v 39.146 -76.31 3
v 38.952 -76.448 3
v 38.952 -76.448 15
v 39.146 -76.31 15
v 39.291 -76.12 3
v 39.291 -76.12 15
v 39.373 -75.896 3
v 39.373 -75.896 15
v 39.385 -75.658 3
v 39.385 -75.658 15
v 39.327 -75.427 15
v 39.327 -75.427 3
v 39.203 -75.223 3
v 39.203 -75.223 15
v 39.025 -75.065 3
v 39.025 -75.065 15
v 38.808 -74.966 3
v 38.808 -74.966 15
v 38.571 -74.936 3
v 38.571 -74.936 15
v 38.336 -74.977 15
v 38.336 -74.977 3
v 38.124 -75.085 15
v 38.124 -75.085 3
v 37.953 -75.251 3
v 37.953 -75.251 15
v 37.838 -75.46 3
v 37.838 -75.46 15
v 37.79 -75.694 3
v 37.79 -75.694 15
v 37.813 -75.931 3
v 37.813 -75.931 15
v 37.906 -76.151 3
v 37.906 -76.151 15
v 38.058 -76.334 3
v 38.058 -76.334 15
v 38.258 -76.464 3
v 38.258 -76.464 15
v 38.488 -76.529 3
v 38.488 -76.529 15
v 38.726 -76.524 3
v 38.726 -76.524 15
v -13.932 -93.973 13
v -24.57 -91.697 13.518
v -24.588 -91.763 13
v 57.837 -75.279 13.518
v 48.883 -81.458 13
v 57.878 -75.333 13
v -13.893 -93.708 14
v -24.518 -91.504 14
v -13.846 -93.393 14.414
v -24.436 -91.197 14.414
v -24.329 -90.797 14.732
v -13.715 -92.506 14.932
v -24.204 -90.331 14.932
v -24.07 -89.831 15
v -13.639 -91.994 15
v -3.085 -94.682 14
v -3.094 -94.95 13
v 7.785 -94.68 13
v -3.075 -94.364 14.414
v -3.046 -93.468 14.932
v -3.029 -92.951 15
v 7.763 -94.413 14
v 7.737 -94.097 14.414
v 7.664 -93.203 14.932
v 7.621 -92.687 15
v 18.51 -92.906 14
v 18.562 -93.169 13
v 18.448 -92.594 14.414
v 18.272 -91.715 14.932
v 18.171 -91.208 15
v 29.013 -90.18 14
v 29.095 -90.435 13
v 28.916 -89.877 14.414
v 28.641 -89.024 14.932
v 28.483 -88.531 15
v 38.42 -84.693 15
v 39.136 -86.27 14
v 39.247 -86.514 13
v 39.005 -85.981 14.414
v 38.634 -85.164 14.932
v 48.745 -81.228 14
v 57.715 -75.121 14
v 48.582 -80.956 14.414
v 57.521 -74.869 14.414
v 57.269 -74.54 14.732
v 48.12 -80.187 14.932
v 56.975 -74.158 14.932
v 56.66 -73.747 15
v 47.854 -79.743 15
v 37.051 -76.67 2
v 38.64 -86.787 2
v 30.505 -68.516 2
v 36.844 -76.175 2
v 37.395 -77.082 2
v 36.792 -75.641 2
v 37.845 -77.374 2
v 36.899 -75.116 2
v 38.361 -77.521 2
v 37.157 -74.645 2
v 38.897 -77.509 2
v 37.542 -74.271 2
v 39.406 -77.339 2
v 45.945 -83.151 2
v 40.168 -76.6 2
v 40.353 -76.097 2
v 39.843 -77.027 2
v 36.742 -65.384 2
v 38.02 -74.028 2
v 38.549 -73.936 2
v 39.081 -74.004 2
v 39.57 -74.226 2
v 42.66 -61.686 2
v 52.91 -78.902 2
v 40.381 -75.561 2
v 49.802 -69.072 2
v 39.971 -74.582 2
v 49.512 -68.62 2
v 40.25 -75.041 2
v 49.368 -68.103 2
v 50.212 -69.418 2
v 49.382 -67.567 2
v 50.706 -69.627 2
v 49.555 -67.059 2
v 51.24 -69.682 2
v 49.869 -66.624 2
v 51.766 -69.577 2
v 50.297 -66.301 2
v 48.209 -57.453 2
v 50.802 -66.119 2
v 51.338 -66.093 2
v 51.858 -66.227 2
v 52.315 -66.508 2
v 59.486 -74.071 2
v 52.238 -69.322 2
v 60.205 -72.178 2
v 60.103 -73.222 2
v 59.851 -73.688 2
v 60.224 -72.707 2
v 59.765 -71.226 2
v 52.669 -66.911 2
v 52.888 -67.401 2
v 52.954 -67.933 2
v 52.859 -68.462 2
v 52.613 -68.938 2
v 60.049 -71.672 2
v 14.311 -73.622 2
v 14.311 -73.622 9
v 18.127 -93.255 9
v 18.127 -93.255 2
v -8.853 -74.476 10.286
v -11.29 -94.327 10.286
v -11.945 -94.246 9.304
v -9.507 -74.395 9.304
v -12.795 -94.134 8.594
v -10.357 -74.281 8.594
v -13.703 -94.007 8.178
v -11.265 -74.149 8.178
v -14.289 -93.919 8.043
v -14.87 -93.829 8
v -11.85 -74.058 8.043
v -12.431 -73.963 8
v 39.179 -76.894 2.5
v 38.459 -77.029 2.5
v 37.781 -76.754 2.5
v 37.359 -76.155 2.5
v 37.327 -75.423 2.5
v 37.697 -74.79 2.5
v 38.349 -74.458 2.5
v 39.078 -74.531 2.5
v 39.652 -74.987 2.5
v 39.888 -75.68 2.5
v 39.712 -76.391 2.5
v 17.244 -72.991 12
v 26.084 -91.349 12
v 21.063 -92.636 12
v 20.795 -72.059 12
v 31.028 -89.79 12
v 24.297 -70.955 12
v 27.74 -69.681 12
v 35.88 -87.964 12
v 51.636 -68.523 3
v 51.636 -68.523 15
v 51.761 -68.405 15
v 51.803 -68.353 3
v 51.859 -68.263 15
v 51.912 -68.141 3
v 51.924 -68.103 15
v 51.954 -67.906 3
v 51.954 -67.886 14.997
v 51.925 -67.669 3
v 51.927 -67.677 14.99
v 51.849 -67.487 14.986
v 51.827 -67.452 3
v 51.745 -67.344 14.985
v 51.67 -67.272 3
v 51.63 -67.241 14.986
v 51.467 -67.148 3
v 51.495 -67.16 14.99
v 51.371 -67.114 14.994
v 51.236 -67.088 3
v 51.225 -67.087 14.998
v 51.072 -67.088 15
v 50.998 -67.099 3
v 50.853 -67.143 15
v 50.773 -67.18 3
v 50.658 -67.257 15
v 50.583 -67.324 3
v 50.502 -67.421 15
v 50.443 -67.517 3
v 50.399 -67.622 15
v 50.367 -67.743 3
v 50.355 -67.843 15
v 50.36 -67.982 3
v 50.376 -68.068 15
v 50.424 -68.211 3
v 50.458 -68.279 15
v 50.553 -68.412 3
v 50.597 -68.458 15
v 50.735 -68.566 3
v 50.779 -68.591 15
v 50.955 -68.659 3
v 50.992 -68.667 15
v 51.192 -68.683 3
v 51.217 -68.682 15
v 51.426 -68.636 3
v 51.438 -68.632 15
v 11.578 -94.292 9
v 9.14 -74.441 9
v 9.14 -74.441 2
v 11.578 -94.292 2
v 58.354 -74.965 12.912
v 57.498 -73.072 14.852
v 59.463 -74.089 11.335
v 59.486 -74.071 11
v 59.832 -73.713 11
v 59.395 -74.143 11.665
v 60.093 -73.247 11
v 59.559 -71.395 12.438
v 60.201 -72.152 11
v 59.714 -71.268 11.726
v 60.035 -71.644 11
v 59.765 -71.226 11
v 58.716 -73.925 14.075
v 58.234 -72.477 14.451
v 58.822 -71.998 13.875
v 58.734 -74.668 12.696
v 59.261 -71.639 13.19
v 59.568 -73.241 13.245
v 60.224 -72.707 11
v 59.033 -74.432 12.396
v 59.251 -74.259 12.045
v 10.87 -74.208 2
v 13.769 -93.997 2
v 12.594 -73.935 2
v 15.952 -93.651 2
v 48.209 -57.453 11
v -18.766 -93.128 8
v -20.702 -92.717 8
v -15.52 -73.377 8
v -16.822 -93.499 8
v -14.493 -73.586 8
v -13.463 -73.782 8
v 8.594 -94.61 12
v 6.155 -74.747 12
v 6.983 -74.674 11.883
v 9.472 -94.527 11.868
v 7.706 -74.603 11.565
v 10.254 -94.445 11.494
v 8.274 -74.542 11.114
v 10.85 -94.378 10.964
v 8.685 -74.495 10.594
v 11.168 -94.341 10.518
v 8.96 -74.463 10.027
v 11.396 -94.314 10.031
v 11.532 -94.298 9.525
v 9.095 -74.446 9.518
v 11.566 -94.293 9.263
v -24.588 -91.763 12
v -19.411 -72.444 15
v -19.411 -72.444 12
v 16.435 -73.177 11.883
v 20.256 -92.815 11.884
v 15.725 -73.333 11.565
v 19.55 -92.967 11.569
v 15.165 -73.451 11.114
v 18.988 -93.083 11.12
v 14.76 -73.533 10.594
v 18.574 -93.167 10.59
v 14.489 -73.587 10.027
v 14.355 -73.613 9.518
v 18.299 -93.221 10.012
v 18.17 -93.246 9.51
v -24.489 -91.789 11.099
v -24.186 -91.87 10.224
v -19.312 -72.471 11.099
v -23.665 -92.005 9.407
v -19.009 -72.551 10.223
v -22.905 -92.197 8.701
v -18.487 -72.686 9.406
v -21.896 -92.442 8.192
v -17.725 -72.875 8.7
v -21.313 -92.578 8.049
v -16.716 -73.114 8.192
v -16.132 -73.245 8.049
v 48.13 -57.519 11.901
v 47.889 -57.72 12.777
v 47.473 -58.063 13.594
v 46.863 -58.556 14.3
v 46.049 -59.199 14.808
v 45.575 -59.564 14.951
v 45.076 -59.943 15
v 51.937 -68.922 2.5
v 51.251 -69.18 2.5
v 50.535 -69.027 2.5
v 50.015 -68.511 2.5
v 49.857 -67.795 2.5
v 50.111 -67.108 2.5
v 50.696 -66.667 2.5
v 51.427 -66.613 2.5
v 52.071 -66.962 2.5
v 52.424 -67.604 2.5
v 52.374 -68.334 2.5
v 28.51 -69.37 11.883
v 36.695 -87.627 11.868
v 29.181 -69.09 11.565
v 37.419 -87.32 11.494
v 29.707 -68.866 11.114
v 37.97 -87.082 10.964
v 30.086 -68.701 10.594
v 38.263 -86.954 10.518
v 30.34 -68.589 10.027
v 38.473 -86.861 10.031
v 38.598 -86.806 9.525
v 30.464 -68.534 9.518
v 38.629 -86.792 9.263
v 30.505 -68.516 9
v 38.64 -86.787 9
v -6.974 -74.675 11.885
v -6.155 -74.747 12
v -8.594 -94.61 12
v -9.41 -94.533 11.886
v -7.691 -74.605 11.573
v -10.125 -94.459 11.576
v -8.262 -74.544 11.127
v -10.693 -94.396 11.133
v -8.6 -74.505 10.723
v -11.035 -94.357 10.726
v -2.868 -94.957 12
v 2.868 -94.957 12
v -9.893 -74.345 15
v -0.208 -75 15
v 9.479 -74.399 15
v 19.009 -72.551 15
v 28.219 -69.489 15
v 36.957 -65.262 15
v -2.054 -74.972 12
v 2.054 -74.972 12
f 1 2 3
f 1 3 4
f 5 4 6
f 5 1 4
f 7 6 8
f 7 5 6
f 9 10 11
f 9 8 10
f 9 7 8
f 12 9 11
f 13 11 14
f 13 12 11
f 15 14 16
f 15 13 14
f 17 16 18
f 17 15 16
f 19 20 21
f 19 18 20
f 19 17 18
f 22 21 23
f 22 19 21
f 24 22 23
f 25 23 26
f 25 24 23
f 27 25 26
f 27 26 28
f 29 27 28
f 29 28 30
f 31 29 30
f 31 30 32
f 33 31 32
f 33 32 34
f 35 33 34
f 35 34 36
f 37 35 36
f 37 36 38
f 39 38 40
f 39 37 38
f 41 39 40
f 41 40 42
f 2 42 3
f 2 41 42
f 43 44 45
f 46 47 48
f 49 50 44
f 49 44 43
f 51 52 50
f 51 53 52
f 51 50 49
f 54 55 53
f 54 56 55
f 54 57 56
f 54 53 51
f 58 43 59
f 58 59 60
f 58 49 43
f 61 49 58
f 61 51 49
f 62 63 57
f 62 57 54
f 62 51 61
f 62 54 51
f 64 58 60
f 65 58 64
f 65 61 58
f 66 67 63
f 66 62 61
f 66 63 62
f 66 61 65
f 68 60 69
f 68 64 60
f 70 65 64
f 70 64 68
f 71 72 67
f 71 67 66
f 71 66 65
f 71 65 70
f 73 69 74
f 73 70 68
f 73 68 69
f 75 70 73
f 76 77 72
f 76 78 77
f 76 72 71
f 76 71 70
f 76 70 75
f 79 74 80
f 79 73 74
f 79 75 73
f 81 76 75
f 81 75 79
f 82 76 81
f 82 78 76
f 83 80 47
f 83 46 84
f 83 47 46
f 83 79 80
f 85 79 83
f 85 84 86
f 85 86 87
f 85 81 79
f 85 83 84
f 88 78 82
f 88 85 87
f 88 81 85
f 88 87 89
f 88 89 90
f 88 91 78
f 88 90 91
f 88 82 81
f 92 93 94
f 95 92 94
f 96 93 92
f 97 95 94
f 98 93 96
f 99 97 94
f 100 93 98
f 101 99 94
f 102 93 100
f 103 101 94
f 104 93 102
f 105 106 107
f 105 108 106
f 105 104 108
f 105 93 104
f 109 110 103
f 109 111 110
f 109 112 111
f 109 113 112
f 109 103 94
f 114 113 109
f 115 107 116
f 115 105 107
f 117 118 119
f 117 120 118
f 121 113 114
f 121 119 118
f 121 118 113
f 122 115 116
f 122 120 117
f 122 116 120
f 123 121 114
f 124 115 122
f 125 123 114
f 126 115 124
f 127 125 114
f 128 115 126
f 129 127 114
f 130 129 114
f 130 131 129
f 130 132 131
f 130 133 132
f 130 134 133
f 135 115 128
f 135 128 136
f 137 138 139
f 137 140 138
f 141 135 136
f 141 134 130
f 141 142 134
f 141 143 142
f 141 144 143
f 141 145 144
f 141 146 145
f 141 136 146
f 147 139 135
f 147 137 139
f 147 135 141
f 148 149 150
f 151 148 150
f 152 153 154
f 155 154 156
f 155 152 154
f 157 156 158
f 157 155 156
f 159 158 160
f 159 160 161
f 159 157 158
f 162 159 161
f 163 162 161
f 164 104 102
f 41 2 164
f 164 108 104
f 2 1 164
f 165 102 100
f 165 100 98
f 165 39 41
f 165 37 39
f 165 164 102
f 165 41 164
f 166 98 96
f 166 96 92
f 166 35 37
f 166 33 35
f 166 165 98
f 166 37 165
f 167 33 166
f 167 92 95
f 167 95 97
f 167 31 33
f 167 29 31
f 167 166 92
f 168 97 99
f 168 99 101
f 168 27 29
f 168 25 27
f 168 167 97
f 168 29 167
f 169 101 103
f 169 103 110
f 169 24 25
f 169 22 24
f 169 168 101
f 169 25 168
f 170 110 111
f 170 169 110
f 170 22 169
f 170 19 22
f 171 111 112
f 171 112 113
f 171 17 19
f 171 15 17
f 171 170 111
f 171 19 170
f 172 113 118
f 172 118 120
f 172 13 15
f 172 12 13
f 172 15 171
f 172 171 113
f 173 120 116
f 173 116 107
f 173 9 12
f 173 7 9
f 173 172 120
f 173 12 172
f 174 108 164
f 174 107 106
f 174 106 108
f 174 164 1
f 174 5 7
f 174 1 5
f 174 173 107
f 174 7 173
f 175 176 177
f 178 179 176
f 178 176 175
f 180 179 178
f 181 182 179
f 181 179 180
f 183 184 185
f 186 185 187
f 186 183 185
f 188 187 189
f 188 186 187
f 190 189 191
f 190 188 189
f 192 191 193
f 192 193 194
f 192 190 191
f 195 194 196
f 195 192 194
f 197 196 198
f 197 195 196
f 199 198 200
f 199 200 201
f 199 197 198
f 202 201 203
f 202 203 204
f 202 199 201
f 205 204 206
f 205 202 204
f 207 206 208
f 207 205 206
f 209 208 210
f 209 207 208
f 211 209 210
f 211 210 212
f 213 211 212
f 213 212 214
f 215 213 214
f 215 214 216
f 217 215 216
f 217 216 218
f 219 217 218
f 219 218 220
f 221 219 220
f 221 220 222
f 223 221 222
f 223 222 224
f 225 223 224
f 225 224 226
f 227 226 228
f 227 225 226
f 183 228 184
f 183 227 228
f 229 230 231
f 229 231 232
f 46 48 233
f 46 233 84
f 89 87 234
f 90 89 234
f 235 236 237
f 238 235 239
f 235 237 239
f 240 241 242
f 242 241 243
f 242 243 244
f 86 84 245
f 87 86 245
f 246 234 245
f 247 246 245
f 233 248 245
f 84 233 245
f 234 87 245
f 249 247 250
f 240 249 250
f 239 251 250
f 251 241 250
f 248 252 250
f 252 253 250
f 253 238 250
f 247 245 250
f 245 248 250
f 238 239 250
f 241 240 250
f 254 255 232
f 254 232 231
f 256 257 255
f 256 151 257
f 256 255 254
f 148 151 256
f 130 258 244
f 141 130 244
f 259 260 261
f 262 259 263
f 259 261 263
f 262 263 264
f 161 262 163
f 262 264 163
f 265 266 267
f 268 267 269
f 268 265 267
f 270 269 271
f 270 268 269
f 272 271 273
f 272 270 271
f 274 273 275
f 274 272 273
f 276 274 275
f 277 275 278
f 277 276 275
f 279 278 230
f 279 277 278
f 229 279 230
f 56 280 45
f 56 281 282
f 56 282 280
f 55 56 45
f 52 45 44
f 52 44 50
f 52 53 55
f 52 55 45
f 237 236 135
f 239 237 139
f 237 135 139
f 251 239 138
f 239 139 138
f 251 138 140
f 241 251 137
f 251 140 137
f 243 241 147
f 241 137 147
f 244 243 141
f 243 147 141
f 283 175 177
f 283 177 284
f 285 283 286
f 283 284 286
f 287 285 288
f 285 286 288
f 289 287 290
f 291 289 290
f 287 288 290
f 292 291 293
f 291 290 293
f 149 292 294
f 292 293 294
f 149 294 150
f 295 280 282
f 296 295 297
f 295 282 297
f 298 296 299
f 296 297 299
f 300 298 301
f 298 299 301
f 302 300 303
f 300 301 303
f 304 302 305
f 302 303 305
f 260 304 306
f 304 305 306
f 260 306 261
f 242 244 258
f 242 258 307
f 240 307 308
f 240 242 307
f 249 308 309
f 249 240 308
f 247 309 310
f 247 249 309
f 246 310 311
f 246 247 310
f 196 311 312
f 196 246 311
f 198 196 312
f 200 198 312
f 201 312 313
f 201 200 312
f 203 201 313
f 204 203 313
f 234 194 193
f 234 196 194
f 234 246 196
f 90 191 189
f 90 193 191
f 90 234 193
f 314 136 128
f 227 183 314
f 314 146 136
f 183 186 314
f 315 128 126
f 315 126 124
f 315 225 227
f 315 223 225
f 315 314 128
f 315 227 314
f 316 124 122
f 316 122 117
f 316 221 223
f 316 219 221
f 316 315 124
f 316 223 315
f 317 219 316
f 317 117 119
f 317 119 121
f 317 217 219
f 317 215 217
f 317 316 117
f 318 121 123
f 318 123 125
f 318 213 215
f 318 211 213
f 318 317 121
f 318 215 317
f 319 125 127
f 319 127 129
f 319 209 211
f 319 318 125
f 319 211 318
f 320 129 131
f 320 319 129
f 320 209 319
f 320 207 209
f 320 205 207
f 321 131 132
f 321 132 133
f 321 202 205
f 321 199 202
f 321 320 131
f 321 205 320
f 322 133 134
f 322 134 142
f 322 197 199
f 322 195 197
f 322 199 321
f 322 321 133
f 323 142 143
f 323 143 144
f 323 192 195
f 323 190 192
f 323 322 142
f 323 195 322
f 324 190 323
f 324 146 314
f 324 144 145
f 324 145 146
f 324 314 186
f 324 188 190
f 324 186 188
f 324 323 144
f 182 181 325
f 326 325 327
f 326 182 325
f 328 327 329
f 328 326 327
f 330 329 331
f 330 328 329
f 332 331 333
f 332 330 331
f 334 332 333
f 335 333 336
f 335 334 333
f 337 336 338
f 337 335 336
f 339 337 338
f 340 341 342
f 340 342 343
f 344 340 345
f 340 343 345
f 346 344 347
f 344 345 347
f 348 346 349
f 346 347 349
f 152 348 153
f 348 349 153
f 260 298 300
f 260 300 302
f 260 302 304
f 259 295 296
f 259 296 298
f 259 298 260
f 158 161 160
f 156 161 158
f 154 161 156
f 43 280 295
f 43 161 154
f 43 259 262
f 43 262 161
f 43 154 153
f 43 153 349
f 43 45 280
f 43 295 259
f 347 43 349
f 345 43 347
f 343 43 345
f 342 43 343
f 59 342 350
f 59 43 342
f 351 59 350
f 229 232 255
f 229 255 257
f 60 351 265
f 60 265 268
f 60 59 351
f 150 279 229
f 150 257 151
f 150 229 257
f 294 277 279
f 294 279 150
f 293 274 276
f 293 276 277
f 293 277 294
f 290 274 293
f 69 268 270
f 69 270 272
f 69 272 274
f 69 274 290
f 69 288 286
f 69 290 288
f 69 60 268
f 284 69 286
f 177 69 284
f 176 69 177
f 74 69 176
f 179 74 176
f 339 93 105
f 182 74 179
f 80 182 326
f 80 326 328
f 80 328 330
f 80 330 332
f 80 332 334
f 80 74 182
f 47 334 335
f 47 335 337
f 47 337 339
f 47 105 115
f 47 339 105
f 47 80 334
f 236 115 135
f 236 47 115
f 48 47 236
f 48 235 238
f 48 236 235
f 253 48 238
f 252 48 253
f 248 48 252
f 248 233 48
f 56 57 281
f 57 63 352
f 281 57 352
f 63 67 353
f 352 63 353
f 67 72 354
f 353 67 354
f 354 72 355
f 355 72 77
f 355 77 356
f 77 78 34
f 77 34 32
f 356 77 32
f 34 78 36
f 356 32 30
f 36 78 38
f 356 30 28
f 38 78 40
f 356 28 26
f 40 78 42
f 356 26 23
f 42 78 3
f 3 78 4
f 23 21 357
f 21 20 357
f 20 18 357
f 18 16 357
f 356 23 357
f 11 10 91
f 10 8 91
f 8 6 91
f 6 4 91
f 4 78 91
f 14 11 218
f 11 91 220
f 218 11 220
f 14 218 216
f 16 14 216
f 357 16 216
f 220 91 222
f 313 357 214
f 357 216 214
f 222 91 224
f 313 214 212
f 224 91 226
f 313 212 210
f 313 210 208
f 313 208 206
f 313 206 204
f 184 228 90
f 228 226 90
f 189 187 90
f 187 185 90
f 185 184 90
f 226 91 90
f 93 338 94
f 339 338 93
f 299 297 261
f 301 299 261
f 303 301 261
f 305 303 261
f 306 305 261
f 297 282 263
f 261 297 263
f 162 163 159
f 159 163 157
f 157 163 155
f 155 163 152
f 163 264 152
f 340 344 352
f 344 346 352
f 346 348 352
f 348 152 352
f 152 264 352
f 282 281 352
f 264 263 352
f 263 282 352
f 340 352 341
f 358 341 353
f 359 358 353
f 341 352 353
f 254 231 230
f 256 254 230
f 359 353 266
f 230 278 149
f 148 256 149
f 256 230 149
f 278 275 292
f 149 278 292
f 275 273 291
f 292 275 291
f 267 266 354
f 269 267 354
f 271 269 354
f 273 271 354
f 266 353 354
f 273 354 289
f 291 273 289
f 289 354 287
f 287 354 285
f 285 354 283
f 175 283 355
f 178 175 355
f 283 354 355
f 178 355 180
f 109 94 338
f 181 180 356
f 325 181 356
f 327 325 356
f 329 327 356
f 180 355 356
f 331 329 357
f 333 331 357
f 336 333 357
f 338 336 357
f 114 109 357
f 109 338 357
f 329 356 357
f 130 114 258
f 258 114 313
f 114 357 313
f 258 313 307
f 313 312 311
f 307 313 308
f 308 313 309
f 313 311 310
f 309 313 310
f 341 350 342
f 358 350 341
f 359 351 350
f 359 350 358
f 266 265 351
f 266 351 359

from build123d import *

# Parameters (mm, degrees)
CYLINDER017_R               = 0.8
CYLINDER017_DEPTH           = 20
CYLINDER018_R               = 0.8
CYLINDER018_DEPTH           = 20
CYLINDER019_R               = 0.8
CYLINDER019_DEPTH           = 20
CYLINDER020_R               = 0.8
CYLINDER020_DEPTH           = 20
FUSION007_PLACEMENT_ANGLE   = 10
FUSION008_PLACEMENT_ANGLE   = 297
CYLINDER015_W               = 95
CYLINDER015_H               = 10
CYLINDER015_ANGLE           = 14
CYLINDER015_PLACEMENT_ANGLE = 263
FILLET_R                    = 3
BOX_W                       = 30
BOX_H                       = 30
BOX_DEPTH                   = 8
CYLINDER029_W               = 95
CYLINDER029_H               = 10
CYLINDER029_ANGLE           = 13
CYLINDER029_PLACEMENT_ANGLE = 281
FILLET026_R                 = 3
CYLINDER016_W               = 75
CYLINDER016_H               = 19
CYLINDER016_ANGLE           = 140
CYLINDER016_PLACEMENT_ANGLE = 250
CYLINDER014_W               = 95
CYLINDER014_H               = 13
CYLINDER014_ANGLE           = 55
CYLINDER014_PLACEMENT_ANGLE = 255
FILLET013_R                 = 4
FILLET014_R                 = 2
FILLET027_R                 = 4
CHAMFER_SIZE                = 1


with BuildPart() as cylinder017:
    # Cylinder017 → Cylinder017 (new body)
    with BuildSketch(Plane(origin=(85, 0, 0), x_dir=(1, 0, 0), z_dir=(0, 0, 1))):
        Circle(CYLINDER017_R)
    extrude(amount=CYLINDER017_DEPTH)


with BuildPart() as fusion006:
    # Cylinder018 → Cylinder018 (new body)
    with BuildSketch(Plane(origin=(-85, 0, 0), x_dir=(1, 0, 0), z_dir=(0, 0, 1))):
        Circle(CYLINDER018_R)
    extrude(amount=CYLINDER018_DEPTH)

    # Fusion006: union Cylinder017
    add(cylinder017.part)


with BuildPart() as cylinder019:
    # Cylinder019 → Cylinder019 (new body)
    with BuildSketch(Plane(origin=(85, 0, 0), x_dir=(1, 0, 0), z_dir=(0, 0, 1))):
        Circle(CYLINDER019_R)
    extrude(amount=CYLINDER019_DEPTH)


with BuildPart() as toothscrewholles:
    # Cylinder020 → Cylinder020 (new body)
    with BuildSketch(Plane(origin=(-85, 0, 0), x_dir=(1, 0, 0), z_dir=(0, 0, 1))):
        Circle(CYLINDER020_R)
    extrude(amount=CYLINDER020_DEPTH)

    # Fusion007: union Cylinder019
    add(cylinder019.part)


with BuildPart() as toothscrewholles_1:
    # Fusion007 placement: moved
    add(toothscrewholles.part.rotate(Axis((0, 0, 0), (0, 0, 1)), FUSION007_PLACEMENT_ANGLE))

    # Fusion008: union Fusion006
    add(fusion006.part)


with BuildPart() as toothscrewholles_2:
    # Fusion008 placement: moved
    add(toothscrewholles_1.part.rotate(Axis((0, 0, 0), (0, 0, 1)), FUSION008_PLACEMENT_ANGLE))


with BuildPart() as fillet_body:
    # Cylinder015 → Cylinder015 (revolve)
    with BuildSketch(Plane.XZ):
        with Locations((47.5, 5)):
            Rectangle(CYLINDER015_W, CYLINDER015_H)
    revolve(axis=Axis((0, 0, 0), (0, 0, 1)), revolution_arc=CYLINDER015_ANGLE)


with BuildPart() as fillet_body_1:
    # Cylinder015 placement: moved
    add(fillet_body.part.moved(Location((0, 0, 2))).rotate(Axis((0, 0, 2), (0, 0, 1)), CYLINDER015_PLACEMENT_ANGLE))

    # Fillet
    fillet_edges = [fillet_body_1.edges().sort_by_distance(p)[0] for p in [
        (5.788794, -47.145942, 12),
        (-5.788794, -47.145942, 12),
    ]]
    fillet(fillet_edges, radius=FILLET_R)


with BuildPart() as cube:
    # Box → Box (new body)
    with BuildSketch(Plane(origin=(-35, -100, 0), x_dir=(1, 0, 0), z_dir=(0, 0, 1))):
        with Locations((15, 15)):
            Rectangle(BOX_W, BOX_H)
    extrude(amount=BOX_DEPTH)


with BuildPart() as fusion:
    # Cylinder029 → Cylinder029 (revolve)
    with BuildSketch(Plane.XZ):
        with Locations((47.5, 5)):
            Rectangle(CYLINDER029_W, CYLINDER029_H)
    revolve(axis=Axis((0, 0, 0), (0, 0, 1)), revolution_arc=CYLINDER029_ANGLE)


with BuildPart() as fusion_1:
    # Cylinder029 placement: moved
    add(fusion.part.moved(Location((0, 0, 2))).rotate(Axis((0, 0, 2), (0, 0, 1)), CYLINDER029_PLACEMENT_ANGLE))

    # Fillet026
    fillet026_edges = [fusion_1.edges().sort_by_distance(p)[0] for p in [
        (19.319991, -43.393409, 12),
        (9.063427, -46.627291, 12),
    ]]
    fillet(fillet026_edges, radius=FILLET026_R)

    # Fusion: union Fillet body, Cube
    add(fillet_body_1.part)
    add(cube.part)


with BuildPart() as cylinder016:
    # Cylinder016 → Cylinder016 (revolve)
    with BuildSketch(Plane.XZ):
        with Locations((37.5, 9.5)):
            Rectangle(CYLINDER016_W, CYLINDER016_H)
    revolve(axis=Axis((0, 0, 0), (0, 0, 1)), revolution_arc=CYLINDER016_ANGLE)


with BuildPart() as cylinder016_1:
    # Cylinder016 placement: moved
    add(cylinder016.part.moved(Location((0, 0, 2))).rotate(Axis((0, 0, 2), (0, 0, 1)), CYLINDER016_PLACEMENT_ANGLE))


with BuildPart() as closearm:
    # Cylinder014 → Cylinder014 (revolve)
    with BuildSketch(Plane.XZ):
        with Locations((47.5, 6.5)):
            Rectangle(CYLINDER014_W, CYLINDER014_H)
    revolve(axis=Axis((0, 0, 0), (0, 0, 1)), revolution_arc=CYLINDER014_ANGLE)


with BuildPart() as closearm_1:
    # Cylinder014 placement: moved
    add(closearm.part.moved(Location((0, 0, 2))).rotate(Axis((0, 0, 2), (0, 0, 1)), CYLINDER014_PLACEMENT_ANGLE))

    # Cut: cut Cylinder016
    add(cylinder016_1.part, mode=Mode.SUBTRACT)

    # Fillet013
    fillet013_edges = [closearm_1.edges().sort_by_distance(p)[0] for p in [
        (54.636947, -65.113778, 15),
    ]]
    fillet(fillet013_edges, radius=FILLET013_R)

    # Fillet014
    fillet014_edges = [closearm_1.edges().sort_by_distance(p)[0] for p in [
        (18.604179, -93.160531, 15),
    ]]
    fillet(fillet014_edges, radius=FILLET014_R)

    # Cut018: cut Fusion
    add(fusion_1.part, mode=Mode.SUBTRACT)

    # Fillet027
    fillet027_edges = [closearm_1.edges().sort_by_distance(p)[0] for p in [
        (-10.358894, -84.366423, 8),
        (-21.999619, -82.103695, 8),
    ]]
    fillet(fillet027_edges, radius=FILLET027_R)

    # Cut019: cut ToothScrewHolles
    add(toothscrewholles_2.part, mode=Mode.SUBTRACT)

    # Chamfer
    chamfer_edges = [closearm_1.edges().sort_by_distance(p)[0] for p in [
        (38.226, -75.022749, 2),
        (50.672825, -67.24511, 2),
    ]]
    chamfer(chamfer_edges, length=CHAMFER_SIZE)


solid = closearm_1.part
